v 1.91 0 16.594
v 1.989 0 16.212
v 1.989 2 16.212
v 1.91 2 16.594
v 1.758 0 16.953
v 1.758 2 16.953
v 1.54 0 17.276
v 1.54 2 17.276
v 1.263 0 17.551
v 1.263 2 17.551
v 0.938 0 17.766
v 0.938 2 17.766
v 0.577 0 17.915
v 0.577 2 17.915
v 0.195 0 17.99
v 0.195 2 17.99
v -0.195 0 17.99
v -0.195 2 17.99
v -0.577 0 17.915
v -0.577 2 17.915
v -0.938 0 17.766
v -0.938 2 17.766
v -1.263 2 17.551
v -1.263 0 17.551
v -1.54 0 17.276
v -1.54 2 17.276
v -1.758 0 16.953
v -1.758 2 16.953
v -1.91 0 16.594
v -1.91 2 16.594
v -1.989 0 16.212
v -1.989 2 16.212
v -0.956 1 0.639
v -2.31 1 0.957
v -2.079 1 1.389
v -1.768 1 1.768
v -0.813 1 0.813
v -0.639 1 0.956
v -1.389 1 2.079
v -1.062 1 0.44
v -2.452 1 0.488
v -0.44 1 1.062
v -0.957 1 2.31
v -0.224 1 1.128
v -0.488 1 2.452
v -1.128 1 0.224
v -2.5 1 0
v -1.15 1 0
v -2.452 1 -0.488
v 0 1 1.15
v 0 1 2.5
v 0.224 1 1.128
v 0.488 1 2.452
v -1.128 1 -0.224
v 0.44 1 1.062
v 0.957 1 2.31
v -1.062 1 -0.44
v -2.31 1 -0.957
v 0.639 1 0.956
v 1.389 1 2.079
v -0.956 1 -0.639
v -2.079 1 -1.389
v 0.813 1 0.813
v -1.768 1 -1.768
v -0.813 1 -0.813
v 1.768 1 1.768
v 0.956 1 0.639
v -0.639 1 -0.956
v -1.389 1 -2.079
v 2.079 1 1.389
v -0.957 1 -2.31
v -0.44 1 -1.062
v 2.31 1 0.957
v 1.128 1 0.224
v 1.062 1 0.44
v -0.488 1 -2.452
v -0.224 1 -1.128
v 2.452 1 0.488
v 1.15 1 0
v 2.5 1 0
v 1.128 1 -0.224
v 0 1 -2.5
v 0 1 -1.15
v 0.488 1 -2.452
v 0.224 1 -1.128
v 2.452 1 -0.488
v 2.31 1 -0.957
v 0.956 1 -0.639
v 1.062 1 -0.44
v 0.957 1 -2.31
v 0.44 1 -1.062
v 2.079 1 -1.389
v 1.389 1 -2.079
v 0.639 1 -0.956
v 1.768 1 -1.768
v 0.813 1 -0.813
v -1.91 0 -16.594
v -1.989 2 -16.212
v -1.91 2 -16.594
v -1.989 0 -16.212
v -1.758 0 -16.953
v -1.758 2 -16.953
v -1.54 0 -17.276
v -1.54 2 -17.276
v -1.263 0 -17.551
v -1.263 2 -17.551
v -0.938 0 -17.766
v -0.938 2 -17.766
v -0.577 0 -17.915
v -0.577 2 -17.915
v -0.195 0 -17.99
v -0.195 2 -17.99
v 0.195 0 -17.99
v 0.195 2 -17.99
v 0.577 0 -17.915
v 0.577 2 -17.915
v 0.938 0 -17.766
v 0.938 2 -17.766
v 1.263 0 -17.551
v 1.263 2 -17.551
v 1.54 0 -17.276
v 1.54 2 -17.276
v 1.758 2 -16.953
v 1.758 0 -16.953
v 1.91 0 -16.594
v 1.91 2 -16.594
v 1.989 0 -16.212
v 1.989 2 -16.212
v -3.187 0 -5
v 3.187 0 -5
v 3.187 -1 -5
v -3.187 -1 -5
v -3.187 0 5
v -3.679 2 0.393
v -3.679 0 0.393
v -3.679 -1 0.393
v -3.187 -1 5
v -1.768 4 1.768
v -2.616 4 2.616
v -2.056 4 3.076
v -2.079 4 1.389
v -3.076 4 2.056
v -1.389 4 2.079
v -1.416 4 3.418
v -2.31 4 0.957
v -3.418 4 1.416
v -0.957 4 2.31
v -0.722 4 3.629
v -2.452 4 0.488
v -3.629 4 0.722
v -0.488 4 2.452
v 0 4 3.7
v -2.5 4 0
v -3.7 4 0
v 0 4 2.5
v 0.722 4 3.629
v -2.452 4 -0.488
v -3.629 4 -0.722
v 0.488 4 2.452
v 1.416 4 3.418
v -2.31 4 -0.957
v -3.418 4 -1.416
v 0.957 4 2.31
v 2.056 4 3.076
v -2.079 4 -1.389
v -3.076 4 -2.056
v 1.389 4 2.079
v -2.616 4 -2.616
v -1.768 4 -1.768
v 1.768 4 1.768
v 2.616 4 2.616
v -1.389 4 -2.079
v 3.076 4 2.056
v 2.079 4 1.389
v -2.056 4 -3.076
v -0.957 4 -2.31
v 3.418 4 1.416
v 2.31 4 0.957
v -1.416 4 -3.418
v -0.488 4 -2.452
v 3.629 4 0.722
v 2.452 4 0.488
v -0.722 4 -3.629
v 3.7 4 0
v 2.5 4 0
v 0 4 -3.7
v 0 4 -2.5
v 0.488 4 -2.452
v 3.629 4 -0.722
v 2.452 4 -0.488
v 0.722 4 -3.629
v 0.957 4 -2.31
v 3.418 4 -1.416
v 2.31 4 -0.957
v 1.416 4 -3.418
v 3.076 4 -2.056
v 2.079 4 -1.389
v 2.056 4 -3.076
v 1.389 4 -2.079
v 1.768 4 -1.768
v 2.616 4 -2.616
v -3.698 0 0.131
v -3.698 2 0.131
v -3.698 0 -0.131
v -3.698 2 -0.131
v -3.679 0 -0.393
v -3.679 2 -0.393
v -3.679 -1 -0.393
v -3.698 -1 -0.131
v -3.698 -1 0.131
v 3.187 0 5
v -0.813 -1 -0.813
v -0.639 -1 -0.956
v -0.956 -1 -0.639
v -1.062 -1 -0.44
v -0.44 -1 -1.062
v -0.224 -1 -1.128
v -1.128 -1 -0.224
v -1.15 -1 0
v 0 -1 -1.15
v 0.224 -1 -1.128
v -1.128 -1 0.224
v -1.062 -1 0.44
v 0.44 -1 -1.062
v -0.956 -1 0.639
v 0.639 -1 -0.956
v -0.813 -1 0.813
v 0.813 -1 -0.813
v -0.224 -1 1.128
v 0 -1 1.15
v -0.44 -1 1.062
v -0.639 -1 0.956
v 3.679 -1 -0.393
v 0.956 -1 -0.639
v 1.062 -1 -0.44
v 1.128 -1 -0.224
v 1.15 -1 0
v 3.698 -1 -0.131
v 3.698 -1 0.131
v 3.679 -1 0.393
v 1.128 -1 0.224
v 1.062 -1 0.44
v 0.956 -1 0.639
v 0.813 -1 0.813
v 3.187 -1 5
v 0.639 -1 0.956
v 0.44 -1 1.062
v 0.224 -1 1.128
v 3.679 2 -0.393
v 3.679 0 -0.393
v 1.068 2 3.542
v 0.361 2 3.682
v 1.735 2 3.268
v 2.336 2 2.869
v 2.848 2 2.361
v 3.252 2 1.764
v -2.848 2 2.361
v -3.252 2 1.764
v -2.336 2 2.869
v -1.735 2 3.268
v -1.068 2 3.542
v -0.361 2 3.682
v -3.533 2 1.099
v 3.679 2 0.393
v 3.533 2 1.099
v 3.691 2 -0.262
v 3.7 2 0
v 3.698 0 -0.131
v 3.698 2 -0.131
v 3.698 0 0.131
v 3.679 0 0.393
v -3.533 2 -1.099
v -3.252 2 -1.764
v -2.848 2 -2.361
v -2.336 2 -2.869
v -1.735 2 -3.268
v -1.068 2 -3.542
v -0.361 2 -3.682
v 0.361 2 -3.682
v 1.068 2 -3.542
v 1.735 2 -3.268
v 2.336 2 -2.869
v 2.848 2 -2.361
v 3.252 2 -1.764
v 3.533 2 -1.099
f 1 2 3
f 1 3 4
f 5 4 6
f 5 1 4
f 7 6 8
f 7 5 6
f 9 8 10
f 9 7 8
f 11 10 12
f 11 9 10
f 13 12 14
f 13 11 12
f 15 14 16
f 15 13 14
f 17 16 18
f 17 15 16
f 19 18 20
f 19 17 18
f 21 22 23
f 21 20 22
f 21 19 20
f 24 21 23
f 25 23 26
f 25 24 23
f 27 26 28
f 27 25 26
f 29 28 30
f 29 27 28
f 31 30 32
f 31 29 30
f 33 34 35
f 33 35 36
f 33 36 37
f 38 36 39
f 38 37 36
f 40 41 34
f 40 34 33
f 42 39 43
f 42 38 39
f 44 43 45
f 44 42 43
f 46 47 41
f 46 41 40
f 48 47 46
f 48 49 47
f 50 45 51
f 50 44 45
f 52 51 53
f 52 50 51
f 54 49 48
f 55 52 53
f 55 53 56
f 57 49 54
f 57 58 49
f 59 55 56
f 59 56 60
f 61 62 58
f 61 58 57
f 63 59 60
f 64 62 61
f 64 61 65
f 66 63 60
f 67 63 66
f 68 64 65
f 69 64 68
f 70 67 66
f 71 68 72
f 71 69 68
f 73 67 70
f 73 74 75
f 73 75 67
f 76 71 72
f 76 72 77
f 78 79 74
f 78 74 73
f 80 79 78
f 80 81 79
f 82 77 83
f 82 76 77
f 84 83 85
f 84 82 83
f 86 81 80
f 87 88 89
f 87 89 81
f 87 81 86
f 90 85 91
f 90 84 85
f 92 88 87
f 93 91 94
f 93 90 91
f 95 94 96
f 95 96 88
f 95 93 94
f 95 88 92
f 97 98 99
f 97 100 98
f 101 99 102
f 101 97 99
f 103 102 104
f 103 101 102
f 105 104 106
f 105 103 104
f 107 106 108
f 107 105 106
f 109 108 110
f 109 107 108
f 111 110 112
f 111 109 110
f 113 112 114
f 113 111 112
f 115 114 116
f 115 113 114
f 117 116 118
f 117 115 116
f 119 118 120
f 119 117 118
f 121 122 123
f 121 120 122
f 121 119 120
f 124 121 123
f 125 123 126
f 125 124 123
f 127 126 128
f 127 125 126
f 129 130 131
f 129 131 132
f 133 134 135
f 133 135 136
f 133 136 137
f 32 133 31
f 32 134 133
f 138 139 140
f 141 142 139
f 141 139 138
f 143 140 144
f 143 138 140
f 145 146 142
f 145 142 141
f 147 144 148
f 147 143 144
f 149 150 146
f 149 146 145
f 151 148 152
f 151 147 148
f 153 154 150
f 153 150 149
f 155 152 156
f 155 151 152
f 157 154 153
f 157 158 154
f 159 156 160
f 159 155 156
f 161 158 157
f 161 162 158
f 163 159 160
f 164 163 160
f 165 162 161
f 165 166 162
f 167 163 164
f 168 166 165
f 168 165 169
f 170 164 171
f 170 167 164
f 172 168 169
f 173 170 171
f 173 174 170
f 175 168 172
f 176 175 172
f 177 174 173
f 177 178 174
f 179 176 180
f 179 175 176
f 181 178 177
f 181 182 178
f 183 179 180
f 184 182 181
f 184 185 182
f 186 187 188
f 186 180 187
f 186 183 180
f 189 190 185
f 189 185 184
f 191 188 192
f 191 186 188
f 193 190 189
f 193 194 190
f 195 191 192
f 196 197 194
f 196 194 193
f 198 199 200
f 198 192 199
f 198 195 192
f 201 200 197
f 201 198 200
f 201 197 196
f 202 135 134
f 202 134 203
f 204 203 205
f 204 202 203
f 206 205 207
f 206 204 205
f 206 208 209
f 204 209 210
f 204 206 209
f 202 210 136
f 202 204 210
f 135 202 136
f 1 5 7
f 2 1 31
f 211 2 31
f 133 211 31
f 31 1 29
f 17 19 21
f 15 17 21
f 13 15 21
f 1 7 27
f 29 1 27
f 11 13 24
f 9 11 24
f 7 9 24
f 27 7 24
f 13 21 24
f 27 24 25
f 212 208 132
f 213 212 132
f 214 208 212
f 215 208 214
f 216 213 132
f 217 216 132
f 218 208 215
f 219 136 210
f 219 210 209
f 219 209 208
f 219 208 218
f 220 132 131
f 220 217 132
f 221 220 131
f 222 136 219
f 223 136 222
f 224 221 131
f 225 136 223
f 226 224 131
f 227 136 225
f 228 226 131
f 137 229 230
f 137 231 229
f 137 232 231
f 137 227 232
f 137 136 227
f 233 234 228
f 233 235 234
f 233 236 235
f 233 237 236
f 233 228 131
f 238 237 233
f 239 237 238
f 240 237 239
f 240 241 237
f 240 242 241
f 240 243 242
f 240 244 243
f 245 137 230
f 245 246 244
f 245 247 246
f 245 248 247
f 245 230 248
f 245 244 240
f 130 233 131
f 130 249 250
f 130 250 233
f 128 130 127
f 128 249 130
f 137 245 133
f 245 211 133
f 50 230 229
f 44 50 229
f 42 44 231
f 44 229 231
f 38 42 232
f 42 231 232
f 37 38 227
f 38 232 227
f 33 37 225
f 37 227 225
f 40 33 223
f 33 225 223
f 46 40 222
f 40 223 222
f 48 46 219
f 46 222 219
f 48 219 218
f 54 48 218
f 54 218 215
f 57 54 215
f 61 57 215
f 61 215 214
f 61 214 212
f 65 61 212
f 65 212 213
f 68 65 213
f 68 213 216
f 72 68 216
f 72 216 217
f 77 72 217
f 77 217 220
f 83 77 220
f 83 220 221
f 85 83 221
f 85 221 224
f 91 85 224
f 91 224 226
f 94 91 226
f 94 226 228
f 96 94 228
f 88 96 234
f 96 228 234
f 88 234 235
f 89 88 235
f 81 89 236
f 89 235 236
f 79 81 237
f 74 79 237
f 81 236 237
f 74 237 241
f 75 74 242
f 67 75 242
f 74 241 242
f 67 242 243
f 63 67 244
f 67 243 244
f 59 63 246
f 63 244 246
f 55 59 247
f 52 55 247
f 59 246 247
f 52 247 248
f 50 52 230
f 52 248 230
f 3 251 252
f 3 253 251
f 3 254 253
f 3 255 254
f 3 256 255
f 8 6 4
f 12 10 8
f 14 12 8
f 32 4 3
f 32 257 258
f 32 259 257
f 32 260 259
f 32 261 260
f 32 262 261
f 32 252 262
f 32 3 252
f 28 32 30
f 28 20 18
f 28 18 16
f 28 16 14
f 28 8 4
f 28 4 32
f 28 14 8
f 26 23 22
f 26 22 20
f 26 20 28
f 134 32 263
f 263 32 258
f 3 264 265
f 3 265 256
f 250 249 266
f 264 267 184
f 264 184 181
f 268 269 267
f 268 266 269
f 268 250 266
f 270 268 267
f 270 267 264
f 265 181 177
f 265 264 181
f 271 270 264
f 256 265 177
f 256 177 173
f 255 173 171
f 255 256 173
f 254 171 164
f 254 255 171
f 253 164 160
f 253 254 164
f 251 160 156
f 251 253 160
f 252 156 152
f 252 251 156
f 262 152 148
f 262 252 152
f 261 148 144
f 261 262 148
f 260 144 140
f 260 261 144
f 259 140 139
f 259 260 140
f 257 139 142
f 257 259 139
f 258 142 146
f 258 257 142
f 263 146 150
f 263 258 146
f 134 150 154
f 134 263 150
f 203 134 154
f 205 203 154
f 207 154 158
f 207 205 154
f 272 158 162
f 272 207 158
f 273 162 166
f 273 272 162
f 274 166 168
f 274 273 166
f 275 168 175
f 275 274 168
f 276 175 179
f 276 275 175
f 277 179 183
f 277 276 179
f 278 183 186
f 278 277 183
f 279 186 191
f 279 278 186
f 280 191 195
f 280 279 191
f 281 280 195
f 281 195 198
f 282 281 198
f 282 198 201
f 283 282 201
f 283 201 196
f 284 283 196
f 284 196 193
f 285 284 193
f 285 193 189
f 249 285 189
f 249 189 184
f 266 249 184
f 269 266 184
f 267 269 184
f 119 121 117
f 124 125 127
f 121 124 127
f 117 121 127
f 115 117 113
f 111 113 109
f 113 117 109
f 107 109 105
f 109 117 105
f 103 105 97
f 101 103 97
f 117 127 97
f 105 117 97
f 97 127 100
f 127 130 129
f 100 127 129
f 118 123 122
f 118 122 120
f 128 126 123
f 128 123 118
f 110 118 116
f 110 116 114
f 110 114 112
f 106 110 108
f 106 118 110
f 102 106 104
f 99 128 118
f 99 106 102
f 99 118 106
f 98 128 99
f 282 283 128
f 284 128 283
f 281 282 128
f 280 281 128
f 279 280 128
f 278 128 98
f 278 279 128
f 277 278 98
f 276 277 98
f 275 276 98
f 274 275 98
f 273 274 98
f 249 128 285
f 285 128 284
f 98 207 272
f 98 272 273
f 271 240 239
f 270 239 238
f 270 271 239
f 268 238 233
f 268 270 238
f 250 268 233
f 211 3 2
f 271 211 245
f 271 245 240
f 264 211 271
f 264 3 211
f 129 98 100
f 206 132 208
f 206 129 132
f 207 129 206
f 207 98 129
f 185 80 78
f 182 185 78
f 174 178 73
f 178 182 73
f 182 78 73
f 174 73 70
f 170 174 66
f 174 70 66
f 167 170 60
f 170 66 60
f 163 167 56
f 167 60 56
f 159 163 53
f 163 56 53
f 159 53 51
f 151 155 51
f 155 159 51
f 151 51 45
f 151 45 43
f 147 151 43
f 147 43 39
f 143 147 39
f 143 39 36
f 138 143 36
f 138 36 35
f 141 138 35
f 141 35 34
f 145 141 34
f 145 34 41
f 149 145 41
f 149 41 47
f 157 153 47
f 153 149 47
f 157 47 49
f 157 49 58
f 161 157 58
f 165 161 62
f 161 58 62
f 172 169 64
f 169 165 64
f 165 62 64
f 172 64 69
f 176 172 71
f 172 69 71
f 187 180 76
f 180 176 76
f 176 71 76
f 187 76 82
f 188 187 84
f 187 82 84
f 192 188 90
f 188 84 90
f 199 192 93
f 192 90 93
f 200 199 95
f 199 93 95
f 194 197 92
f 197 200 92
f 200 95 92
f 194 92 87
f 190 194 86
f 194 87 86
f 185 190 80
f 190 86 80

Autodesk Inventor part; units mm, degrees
ref_plane "YZ Plane" through (0, 0, 0) normal (1, 0, 0) x (0, 1, 0)
ref_plane "XZ Plane" through (0, 0, 0) normal (0, 1, 0) x (-1, 0, 0)
ref_plane "XY Plane" through (0, 0, 0) normal (0, 0, 1) x (1, 0, 0)
sketch "Sketch1" plane through (0, 0, 0) normal (0, 1, 0) x (-1, 0, 0)
  circle A0 centre (0, 0) radius 3.7
  circle A1 centre (0, 16) radius 2
  line L0 (0, 16) -> (0, 0) construction
  line L1 (1.9887, 16.2125) -> (3.6791, 0.3931)
  line L2 (-3.6791, 0.3931) -> (-1.9887, 16.2125)
  line L3 (0, 16) -> (0, 18) construction
  line L4 (0, 0) -> (3.7, 0) construction
  circle A2 centre (0, -16) radius 2
  line L5 (0, -16) -> (0, 0) construction
  line L6 (1.9887, -16.2125) -> (3.6791, -0.3931)
  line L7 (-3.6791, -0.3931) -> (-1.9887, -16.2125)
  line L8 (0, -16) -> (0, -18) construction
  point P0 (3.6791, -0.3931)
  dimension "d0" = 4
  dimension "d1" = 7.4
  dimension "d2" = 18
extrude "Extrusion1" add sketch "Sketch1" along normal blind 2
sketch "Sketch2" plane through (0, 2, 0) normal (0, 1, 0) x (1, 0, 0)
  circle A0 centre (0, 0) radius 3.7
  arc A1 (3.6791, -0.3931) -> (3.6791, 0.3931) centre (0, 0) ccw projected
  line L0 (3.6791, 0.3931) -> (1.9887, 16.2125) projected
  arc A2 (1.9887, 16.2125) -> (-1.9887, 16.2125) centre (0, 16) ccw projected
  line L1 (-1.9887, 16.2125) -> (-3.6791, 0.3931) projected
  arc A3 (-3.6791, 0.3931) -> (-3.6791, -0.3931) centre (0, 0) ccw projected
  line L2 (-3.6791, -0.3931) -> (-1.9887, -16.2125) projected
  arc A4 (-1.9887, -16.2125) -> (1.9887, -16.2125) centre (0, -16) ccw projected
  line L3 (1.9887, -16.2125) -> (3.6791, -0.3931) projected
  circle A5 centre (0, 0) radius 2.5
  point P0 (-3.7, 0)
  dimension "d5" = 1.2
extrude "Extrusion2" add sketch "Sketch2" along normal blind 2 contours A0
extrude "Extrusion3" cut sketch "Sketch2" against normal blind 1 contours A5
sketch "Sketch3" plane through (0, 0, 0) normal (0, -1, 0) x (1, 0, 0)
  arc A0 (3.6791, -0.3931) -> (3.6791, 0.3931) centre (0, 0) ccw projected
  line L0 (1.9887, 16.2125) -> (3.6791, 0.3931) projected
  arc A1 (1.9887, 16.2125) -> (-1.9887, 16.2125) centre (0, 16) ccw projected
  line L1 (-3.6791, 0.3931) -> (-1.9887, 16.2125) projected
  arc A2 (-3.6791, 0.3931) -> (-3.6791, -0.3931) centre (0, 0) ccw projected
  line L2 (-1.9887, -16.2125) -> (-3.6791, -0.3931) projected
  arc A3 (-1.9887, -16.2125) -> (1.9887, -16.2125) centre (0, -16) ccw projected
  line L3 (3.6791, -0.3931) -> (1.9887, -16.2125) projected
  line L4 (3.1868, 5) -> (-3.1868, 5)
  line L5 (3.1868, -5) -> (-3.1868, -5)
  line L6 (0, 5) -> (0, -5) construction
  dimension "d10" = 10
extrude "Extrusion4" add sketch "Sketch3" along normal blind 1 contours L3 L5 L2 A2 L1 L4 L0 A0
sketch "Sketch4" plane through (0, 1, 0) normal (0, 1, 0) x (1, 0, 0)
  point P0 (0, 0)
  point P1 (0, 0)
hole "Hole1" at (0, 1, 0) direction (0, -1, 0) diameter 2.3 end through all
properties part number "MG90s Arm"
